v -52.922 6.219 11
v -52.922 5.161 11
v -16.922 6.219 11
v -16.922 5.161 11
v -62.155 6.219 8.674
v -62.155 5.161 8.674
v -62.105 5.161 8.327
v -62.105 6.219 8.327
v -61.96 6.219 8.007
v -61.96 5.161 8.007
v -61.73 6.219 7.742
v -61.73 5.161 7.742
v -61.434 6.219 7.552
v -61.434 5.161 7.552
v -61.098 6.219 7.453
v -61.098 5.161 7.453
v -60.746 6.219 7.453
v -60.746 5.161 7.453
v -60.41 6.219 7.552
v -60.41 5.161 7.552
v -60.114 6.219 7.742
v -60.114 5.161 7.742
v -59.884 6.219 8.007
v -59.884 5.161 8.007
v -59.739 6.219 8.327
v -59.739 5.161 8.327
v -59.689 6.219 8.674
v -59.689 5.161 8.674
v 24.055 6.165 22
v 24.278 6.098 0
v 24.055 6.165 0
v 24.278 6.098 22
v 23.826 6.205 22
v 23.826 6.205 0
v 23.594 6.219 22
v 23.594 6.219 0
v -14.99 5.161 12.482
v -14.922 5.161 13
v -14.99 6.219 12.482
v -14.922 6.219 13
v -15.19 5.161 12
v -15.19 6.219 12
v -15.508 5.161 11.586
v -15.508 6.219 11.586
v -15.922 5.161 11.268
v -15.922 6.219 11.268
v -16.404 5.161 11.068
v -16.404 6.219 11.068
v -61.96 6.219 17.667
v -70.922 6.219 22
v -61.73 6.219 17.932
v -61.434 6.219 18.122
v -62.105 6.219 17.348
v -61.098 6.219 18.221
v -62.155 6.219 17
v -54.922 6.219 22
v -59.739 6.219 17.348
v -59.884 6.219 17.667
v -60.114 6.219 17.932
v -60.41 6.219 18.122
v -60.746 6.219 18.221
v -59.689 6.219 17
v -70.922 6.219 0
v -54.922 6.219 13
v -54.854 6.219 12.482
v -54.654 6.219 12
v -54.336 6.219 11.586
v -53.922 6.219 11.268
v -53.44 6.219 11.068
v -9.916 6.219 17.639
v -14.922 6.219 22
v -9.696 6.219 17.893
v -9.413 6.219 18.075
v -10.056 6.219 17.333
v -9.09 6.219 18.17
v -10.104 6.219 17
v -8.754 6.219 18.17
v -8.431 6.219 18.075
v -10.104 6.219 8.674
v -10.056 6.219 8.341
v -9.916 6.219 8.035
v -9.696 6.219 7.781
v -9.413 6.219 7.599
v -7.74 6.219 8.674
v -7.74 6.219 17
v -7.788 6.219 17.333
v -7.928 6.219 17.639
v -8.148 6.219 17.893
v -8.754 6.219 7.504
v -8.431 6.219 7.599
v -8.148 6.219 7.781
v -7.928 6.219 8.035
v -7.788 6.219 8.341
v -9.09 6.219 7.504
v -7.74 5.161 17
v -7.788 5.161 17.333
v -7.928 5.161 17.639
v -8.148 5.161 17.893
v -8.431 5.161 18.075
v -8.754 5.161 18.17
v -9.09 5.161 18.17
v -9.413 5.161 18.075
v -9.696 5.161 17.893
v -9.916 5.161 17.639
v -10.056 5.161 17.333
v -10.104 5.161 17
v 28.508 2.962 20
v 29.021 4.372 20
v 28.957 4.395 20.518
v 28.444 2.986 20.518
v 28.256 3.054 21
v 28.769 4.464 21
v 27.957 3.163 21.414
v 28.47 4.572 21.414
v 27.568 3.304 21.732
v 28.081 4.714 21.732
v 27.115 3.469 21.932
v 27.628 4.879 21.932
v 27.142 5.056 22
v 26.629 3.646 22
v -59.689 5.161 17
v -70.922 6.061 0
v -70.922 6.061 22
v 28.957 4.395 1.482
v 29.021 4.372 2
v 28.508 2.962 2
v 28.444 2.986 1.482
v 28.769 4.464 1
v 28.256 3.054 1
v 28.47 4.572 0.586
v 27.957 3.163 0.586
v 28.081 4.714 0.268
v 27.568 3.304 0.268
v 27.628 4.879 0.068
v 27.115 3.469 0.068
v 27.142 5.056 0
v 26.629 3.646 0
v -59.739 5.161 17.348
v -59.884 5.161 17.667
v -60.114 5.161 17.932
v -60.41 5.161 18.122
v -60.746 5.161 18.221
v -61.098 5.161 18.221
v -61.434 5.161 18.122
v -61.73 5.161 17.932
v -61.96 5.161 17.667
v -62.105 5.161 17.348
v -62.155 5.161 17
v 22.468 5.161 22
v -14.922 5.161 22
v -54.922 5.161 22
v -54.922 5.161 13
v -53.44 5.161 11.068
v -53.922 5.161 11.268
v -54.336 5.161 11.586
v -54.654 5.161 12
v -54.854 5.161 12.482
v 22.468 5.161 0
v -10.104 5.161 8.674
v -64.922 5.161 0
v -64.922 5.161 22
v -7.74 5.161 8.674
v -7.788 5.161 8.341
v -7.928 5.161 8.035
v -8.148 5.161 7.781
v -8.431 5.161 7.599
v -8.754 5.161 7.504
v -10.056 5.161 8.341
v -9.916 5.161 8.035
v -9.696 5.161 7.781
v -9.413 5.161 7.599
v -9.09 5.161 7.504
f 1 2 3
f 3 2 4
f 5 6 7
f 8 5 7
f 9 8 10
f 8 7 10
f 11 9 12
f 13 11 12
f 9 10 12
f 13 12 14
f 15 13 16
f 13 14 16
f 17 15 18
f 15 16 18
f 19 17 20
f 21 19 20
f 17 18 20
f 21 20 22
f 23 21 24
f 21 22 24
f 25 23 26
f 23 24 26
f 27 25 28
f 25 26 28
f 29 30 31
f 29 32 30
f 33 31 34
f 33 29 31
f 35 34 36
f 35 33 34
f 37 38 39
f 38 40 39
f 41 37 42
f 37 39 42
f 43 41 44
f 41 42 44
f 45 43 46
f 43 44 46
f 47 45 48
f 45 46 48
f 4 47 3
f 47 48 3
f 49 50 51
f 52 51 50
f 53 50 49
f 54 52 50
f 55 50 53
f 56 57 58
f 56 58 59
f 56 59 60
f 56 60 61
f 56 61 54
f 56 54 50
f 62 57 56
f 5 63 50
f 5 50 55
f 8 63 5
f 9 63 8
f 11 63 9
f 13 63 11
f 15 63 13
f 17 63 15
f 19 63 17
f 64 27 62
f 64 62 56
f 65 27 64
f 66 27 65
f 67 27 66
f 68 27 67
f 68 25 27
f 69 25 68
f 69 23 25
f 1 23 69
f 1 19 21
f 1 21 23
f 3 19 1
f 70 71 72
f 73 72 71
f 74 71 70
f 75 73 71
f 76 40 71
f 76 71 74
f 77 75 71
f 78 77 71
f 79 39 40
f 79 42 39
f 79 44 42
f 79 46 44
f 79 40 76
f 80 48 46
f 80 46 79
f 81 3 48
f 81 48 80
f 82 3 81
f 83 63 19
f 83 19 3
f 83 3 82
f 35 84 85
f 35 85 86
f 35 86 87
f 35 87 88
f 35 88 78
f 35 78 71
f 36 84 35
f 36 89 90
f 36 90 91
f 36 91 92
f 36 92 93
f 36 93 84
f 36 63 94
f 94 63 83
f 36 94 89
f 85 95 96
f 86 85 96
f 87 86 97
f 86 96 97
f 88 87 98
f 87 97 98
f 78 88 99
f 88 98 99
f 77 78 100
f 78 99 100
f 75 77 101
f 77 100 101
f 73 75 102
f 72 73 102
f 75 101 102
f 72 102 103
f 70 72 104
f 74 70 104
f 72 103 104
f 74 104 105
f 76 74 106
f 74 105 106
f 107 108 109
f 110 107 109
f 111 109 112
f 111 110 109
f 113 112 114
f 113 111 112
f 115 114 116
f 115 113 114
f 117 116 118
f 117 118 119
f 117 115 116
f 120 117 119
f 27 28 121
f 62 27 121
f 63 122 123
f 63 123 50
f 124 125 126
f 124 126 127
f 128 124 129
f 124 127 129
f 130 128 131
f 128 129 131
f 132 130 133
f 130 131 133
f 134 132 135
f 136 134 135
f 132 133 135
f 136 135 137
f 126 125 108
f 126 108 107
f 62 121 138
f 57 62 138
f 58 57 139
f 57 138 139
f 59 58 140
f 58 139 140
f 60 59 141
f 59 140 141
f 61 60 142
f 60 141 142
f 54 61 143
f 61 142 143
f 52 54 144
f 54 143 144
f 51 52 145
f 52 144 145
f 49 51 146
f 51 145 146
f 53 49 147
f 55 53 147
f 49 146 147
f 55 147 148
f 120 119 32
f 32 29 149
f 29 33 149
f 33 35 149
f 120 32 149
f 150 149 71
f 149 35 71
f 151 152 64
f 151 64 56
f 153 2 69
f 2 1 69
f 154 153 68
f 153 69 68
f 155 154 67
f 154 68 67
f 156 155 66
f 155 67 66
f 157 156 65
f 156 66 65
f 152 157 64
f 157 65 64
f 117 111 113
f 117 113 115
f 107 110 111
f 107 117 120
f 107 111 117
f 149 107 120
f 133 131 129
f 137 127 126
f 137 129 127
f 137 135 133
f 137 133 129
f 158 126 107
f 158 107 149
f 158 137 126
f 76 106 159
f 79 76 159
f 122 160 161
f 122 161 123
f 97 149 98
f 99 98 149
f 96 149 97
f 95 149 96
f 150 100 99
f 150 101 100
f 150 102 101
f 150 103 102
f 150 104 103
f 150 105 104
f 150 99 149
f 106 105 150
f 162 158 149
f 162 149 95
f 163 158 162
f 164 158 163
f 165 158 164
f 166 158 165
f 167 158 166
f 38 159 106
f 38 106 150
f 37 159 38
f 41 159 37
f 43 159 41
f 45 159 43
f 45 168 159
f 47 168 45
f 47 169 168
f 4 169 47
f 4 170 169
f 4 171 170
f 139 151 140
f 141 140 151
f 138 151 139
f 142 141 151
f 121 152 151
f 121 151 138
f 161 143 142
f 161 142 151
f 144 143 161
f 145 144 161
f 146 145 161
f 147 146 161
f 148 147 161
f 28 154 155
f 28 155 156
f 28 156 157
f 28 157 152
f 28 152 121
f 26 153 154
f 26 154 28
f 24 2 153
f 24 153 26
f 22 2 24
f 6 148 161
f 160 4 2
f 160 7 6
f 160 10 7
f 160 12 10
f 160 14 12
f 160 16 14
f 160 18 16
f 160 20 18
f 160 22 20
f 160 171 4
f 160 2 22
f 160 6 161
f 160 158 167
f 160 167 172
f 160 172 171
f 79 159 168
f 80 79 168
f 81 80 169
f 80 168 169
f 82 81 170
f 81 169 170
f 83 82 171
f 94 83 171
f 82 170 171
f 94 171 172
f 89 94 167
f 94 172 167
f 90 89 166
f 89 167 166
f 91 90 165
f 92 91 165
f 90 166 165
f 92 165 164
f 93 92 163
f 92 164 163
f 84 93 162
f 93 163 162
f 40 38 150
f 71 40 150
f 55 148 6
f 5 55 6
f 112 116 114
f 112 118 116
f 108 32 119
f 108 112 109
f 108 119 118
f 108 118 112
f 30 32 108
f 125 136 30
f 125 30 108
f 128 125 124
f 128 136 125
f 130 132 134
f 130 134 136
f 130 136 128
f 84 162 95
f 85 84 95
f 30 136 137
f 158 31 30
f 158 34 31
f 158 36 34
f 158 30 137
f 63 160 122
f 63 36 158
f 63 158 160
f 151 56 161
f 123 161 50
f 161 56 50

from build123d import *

# Parameters (mm, degrees)
BOSS_EXTRUDE1_DEPTH = 22
FILLET10_R          = 2
FILLET11_R          = 2
SKETCH4_W           = 40
SKETCH4_H           = 18.455921649
CUT_EXTRUDE1_DEPTH  = 30
FILLET12_R          = 2


with BuildPart() as part:
    # Sketch2 → Boss-Extrude1 (new body)
    with BuildSketch(Plane.XY):
        Polygon((-70.922010647, 6.21881141), (23.946585559, 6.21881141), (29.020925711, 4.371902636), (28.507895496, 2.962363705), (22.467605346, 5.160849526), (-64.922010647, 5.160849526), (-70.922010647, 6.060990271), align=None)
    extrude(amount=BOSS_EXTRUDE1_DEPTH)

    # Fillet10
    fillet10_edges = [part.edges().sort_by_distance(p)[0] for p in [
        (28.764410604, 3.667133171, 22),
        (28.764410604, 3.667133171, 0),
    ]]
    fillet(fillet10_edges, radius=FILLET10_R)

    # Fillet11
    fillet11_edges = [part.edges().sort_by_distance(p)[0] for p in [
        (23.946585559, 6.21881141, 11),
    ]]
    fillet(fillet11_edges, radius=FILLET11_R)

    # Sketch4 → Cut-Extrude1 (cut)
    with BuildSketch(Plane.XZ.offset(-5.160849526)):
        with Locations((-34.922010647, 20.227960825)):
            Rectangle(SKETCH4_W, SKETCH4_H)
        with BuildLine():
            Line((-59.68856271, 8.67422642), (-59.68856271, 17))
            ThreePointArc((-59.68856271, 17), (-60.922010647, 18.233447938), (-62.155458585, 17))
            Line((-62.155458585, 17), (-62.155458585, 8.67422642))
            ThreePointArc((-62.155458585, 8.67422642), (-60.922010647, 7.440778483), (-59.68856271, 8.67422642))
        make_face()
        with BuildLine():
            Line((-7.739956374, 8.67422642), (-7.739956374, 17))
            ThreePointArc((-7.739956374, 17), (-8.922010647, 18.182054274), (-10.104064921, 17))
            Line((-10.104064921, 17), (-10.104064921, 8.67422642))
            ThreePointArc((-10.104064921, 8.67422642), (-8.922010647, 7.492172147), (-7.739956374, 8.67422642))
        make_face()
    extrude(amount=-CUT_EXTRUDE1_DEPTH, mode=Mode.SUBTRACT)

    # Fillet12
    fillet12_edges = [part.edges().sort_by_distance(p)[0] for p in [
        (-14.922010647, 5.689830468, 11),
        (-54.922010647, 5.689830468, 11),
    ]]
    fillet(fillet12_edges, radius=FILLET12_R)


solid = part.part
